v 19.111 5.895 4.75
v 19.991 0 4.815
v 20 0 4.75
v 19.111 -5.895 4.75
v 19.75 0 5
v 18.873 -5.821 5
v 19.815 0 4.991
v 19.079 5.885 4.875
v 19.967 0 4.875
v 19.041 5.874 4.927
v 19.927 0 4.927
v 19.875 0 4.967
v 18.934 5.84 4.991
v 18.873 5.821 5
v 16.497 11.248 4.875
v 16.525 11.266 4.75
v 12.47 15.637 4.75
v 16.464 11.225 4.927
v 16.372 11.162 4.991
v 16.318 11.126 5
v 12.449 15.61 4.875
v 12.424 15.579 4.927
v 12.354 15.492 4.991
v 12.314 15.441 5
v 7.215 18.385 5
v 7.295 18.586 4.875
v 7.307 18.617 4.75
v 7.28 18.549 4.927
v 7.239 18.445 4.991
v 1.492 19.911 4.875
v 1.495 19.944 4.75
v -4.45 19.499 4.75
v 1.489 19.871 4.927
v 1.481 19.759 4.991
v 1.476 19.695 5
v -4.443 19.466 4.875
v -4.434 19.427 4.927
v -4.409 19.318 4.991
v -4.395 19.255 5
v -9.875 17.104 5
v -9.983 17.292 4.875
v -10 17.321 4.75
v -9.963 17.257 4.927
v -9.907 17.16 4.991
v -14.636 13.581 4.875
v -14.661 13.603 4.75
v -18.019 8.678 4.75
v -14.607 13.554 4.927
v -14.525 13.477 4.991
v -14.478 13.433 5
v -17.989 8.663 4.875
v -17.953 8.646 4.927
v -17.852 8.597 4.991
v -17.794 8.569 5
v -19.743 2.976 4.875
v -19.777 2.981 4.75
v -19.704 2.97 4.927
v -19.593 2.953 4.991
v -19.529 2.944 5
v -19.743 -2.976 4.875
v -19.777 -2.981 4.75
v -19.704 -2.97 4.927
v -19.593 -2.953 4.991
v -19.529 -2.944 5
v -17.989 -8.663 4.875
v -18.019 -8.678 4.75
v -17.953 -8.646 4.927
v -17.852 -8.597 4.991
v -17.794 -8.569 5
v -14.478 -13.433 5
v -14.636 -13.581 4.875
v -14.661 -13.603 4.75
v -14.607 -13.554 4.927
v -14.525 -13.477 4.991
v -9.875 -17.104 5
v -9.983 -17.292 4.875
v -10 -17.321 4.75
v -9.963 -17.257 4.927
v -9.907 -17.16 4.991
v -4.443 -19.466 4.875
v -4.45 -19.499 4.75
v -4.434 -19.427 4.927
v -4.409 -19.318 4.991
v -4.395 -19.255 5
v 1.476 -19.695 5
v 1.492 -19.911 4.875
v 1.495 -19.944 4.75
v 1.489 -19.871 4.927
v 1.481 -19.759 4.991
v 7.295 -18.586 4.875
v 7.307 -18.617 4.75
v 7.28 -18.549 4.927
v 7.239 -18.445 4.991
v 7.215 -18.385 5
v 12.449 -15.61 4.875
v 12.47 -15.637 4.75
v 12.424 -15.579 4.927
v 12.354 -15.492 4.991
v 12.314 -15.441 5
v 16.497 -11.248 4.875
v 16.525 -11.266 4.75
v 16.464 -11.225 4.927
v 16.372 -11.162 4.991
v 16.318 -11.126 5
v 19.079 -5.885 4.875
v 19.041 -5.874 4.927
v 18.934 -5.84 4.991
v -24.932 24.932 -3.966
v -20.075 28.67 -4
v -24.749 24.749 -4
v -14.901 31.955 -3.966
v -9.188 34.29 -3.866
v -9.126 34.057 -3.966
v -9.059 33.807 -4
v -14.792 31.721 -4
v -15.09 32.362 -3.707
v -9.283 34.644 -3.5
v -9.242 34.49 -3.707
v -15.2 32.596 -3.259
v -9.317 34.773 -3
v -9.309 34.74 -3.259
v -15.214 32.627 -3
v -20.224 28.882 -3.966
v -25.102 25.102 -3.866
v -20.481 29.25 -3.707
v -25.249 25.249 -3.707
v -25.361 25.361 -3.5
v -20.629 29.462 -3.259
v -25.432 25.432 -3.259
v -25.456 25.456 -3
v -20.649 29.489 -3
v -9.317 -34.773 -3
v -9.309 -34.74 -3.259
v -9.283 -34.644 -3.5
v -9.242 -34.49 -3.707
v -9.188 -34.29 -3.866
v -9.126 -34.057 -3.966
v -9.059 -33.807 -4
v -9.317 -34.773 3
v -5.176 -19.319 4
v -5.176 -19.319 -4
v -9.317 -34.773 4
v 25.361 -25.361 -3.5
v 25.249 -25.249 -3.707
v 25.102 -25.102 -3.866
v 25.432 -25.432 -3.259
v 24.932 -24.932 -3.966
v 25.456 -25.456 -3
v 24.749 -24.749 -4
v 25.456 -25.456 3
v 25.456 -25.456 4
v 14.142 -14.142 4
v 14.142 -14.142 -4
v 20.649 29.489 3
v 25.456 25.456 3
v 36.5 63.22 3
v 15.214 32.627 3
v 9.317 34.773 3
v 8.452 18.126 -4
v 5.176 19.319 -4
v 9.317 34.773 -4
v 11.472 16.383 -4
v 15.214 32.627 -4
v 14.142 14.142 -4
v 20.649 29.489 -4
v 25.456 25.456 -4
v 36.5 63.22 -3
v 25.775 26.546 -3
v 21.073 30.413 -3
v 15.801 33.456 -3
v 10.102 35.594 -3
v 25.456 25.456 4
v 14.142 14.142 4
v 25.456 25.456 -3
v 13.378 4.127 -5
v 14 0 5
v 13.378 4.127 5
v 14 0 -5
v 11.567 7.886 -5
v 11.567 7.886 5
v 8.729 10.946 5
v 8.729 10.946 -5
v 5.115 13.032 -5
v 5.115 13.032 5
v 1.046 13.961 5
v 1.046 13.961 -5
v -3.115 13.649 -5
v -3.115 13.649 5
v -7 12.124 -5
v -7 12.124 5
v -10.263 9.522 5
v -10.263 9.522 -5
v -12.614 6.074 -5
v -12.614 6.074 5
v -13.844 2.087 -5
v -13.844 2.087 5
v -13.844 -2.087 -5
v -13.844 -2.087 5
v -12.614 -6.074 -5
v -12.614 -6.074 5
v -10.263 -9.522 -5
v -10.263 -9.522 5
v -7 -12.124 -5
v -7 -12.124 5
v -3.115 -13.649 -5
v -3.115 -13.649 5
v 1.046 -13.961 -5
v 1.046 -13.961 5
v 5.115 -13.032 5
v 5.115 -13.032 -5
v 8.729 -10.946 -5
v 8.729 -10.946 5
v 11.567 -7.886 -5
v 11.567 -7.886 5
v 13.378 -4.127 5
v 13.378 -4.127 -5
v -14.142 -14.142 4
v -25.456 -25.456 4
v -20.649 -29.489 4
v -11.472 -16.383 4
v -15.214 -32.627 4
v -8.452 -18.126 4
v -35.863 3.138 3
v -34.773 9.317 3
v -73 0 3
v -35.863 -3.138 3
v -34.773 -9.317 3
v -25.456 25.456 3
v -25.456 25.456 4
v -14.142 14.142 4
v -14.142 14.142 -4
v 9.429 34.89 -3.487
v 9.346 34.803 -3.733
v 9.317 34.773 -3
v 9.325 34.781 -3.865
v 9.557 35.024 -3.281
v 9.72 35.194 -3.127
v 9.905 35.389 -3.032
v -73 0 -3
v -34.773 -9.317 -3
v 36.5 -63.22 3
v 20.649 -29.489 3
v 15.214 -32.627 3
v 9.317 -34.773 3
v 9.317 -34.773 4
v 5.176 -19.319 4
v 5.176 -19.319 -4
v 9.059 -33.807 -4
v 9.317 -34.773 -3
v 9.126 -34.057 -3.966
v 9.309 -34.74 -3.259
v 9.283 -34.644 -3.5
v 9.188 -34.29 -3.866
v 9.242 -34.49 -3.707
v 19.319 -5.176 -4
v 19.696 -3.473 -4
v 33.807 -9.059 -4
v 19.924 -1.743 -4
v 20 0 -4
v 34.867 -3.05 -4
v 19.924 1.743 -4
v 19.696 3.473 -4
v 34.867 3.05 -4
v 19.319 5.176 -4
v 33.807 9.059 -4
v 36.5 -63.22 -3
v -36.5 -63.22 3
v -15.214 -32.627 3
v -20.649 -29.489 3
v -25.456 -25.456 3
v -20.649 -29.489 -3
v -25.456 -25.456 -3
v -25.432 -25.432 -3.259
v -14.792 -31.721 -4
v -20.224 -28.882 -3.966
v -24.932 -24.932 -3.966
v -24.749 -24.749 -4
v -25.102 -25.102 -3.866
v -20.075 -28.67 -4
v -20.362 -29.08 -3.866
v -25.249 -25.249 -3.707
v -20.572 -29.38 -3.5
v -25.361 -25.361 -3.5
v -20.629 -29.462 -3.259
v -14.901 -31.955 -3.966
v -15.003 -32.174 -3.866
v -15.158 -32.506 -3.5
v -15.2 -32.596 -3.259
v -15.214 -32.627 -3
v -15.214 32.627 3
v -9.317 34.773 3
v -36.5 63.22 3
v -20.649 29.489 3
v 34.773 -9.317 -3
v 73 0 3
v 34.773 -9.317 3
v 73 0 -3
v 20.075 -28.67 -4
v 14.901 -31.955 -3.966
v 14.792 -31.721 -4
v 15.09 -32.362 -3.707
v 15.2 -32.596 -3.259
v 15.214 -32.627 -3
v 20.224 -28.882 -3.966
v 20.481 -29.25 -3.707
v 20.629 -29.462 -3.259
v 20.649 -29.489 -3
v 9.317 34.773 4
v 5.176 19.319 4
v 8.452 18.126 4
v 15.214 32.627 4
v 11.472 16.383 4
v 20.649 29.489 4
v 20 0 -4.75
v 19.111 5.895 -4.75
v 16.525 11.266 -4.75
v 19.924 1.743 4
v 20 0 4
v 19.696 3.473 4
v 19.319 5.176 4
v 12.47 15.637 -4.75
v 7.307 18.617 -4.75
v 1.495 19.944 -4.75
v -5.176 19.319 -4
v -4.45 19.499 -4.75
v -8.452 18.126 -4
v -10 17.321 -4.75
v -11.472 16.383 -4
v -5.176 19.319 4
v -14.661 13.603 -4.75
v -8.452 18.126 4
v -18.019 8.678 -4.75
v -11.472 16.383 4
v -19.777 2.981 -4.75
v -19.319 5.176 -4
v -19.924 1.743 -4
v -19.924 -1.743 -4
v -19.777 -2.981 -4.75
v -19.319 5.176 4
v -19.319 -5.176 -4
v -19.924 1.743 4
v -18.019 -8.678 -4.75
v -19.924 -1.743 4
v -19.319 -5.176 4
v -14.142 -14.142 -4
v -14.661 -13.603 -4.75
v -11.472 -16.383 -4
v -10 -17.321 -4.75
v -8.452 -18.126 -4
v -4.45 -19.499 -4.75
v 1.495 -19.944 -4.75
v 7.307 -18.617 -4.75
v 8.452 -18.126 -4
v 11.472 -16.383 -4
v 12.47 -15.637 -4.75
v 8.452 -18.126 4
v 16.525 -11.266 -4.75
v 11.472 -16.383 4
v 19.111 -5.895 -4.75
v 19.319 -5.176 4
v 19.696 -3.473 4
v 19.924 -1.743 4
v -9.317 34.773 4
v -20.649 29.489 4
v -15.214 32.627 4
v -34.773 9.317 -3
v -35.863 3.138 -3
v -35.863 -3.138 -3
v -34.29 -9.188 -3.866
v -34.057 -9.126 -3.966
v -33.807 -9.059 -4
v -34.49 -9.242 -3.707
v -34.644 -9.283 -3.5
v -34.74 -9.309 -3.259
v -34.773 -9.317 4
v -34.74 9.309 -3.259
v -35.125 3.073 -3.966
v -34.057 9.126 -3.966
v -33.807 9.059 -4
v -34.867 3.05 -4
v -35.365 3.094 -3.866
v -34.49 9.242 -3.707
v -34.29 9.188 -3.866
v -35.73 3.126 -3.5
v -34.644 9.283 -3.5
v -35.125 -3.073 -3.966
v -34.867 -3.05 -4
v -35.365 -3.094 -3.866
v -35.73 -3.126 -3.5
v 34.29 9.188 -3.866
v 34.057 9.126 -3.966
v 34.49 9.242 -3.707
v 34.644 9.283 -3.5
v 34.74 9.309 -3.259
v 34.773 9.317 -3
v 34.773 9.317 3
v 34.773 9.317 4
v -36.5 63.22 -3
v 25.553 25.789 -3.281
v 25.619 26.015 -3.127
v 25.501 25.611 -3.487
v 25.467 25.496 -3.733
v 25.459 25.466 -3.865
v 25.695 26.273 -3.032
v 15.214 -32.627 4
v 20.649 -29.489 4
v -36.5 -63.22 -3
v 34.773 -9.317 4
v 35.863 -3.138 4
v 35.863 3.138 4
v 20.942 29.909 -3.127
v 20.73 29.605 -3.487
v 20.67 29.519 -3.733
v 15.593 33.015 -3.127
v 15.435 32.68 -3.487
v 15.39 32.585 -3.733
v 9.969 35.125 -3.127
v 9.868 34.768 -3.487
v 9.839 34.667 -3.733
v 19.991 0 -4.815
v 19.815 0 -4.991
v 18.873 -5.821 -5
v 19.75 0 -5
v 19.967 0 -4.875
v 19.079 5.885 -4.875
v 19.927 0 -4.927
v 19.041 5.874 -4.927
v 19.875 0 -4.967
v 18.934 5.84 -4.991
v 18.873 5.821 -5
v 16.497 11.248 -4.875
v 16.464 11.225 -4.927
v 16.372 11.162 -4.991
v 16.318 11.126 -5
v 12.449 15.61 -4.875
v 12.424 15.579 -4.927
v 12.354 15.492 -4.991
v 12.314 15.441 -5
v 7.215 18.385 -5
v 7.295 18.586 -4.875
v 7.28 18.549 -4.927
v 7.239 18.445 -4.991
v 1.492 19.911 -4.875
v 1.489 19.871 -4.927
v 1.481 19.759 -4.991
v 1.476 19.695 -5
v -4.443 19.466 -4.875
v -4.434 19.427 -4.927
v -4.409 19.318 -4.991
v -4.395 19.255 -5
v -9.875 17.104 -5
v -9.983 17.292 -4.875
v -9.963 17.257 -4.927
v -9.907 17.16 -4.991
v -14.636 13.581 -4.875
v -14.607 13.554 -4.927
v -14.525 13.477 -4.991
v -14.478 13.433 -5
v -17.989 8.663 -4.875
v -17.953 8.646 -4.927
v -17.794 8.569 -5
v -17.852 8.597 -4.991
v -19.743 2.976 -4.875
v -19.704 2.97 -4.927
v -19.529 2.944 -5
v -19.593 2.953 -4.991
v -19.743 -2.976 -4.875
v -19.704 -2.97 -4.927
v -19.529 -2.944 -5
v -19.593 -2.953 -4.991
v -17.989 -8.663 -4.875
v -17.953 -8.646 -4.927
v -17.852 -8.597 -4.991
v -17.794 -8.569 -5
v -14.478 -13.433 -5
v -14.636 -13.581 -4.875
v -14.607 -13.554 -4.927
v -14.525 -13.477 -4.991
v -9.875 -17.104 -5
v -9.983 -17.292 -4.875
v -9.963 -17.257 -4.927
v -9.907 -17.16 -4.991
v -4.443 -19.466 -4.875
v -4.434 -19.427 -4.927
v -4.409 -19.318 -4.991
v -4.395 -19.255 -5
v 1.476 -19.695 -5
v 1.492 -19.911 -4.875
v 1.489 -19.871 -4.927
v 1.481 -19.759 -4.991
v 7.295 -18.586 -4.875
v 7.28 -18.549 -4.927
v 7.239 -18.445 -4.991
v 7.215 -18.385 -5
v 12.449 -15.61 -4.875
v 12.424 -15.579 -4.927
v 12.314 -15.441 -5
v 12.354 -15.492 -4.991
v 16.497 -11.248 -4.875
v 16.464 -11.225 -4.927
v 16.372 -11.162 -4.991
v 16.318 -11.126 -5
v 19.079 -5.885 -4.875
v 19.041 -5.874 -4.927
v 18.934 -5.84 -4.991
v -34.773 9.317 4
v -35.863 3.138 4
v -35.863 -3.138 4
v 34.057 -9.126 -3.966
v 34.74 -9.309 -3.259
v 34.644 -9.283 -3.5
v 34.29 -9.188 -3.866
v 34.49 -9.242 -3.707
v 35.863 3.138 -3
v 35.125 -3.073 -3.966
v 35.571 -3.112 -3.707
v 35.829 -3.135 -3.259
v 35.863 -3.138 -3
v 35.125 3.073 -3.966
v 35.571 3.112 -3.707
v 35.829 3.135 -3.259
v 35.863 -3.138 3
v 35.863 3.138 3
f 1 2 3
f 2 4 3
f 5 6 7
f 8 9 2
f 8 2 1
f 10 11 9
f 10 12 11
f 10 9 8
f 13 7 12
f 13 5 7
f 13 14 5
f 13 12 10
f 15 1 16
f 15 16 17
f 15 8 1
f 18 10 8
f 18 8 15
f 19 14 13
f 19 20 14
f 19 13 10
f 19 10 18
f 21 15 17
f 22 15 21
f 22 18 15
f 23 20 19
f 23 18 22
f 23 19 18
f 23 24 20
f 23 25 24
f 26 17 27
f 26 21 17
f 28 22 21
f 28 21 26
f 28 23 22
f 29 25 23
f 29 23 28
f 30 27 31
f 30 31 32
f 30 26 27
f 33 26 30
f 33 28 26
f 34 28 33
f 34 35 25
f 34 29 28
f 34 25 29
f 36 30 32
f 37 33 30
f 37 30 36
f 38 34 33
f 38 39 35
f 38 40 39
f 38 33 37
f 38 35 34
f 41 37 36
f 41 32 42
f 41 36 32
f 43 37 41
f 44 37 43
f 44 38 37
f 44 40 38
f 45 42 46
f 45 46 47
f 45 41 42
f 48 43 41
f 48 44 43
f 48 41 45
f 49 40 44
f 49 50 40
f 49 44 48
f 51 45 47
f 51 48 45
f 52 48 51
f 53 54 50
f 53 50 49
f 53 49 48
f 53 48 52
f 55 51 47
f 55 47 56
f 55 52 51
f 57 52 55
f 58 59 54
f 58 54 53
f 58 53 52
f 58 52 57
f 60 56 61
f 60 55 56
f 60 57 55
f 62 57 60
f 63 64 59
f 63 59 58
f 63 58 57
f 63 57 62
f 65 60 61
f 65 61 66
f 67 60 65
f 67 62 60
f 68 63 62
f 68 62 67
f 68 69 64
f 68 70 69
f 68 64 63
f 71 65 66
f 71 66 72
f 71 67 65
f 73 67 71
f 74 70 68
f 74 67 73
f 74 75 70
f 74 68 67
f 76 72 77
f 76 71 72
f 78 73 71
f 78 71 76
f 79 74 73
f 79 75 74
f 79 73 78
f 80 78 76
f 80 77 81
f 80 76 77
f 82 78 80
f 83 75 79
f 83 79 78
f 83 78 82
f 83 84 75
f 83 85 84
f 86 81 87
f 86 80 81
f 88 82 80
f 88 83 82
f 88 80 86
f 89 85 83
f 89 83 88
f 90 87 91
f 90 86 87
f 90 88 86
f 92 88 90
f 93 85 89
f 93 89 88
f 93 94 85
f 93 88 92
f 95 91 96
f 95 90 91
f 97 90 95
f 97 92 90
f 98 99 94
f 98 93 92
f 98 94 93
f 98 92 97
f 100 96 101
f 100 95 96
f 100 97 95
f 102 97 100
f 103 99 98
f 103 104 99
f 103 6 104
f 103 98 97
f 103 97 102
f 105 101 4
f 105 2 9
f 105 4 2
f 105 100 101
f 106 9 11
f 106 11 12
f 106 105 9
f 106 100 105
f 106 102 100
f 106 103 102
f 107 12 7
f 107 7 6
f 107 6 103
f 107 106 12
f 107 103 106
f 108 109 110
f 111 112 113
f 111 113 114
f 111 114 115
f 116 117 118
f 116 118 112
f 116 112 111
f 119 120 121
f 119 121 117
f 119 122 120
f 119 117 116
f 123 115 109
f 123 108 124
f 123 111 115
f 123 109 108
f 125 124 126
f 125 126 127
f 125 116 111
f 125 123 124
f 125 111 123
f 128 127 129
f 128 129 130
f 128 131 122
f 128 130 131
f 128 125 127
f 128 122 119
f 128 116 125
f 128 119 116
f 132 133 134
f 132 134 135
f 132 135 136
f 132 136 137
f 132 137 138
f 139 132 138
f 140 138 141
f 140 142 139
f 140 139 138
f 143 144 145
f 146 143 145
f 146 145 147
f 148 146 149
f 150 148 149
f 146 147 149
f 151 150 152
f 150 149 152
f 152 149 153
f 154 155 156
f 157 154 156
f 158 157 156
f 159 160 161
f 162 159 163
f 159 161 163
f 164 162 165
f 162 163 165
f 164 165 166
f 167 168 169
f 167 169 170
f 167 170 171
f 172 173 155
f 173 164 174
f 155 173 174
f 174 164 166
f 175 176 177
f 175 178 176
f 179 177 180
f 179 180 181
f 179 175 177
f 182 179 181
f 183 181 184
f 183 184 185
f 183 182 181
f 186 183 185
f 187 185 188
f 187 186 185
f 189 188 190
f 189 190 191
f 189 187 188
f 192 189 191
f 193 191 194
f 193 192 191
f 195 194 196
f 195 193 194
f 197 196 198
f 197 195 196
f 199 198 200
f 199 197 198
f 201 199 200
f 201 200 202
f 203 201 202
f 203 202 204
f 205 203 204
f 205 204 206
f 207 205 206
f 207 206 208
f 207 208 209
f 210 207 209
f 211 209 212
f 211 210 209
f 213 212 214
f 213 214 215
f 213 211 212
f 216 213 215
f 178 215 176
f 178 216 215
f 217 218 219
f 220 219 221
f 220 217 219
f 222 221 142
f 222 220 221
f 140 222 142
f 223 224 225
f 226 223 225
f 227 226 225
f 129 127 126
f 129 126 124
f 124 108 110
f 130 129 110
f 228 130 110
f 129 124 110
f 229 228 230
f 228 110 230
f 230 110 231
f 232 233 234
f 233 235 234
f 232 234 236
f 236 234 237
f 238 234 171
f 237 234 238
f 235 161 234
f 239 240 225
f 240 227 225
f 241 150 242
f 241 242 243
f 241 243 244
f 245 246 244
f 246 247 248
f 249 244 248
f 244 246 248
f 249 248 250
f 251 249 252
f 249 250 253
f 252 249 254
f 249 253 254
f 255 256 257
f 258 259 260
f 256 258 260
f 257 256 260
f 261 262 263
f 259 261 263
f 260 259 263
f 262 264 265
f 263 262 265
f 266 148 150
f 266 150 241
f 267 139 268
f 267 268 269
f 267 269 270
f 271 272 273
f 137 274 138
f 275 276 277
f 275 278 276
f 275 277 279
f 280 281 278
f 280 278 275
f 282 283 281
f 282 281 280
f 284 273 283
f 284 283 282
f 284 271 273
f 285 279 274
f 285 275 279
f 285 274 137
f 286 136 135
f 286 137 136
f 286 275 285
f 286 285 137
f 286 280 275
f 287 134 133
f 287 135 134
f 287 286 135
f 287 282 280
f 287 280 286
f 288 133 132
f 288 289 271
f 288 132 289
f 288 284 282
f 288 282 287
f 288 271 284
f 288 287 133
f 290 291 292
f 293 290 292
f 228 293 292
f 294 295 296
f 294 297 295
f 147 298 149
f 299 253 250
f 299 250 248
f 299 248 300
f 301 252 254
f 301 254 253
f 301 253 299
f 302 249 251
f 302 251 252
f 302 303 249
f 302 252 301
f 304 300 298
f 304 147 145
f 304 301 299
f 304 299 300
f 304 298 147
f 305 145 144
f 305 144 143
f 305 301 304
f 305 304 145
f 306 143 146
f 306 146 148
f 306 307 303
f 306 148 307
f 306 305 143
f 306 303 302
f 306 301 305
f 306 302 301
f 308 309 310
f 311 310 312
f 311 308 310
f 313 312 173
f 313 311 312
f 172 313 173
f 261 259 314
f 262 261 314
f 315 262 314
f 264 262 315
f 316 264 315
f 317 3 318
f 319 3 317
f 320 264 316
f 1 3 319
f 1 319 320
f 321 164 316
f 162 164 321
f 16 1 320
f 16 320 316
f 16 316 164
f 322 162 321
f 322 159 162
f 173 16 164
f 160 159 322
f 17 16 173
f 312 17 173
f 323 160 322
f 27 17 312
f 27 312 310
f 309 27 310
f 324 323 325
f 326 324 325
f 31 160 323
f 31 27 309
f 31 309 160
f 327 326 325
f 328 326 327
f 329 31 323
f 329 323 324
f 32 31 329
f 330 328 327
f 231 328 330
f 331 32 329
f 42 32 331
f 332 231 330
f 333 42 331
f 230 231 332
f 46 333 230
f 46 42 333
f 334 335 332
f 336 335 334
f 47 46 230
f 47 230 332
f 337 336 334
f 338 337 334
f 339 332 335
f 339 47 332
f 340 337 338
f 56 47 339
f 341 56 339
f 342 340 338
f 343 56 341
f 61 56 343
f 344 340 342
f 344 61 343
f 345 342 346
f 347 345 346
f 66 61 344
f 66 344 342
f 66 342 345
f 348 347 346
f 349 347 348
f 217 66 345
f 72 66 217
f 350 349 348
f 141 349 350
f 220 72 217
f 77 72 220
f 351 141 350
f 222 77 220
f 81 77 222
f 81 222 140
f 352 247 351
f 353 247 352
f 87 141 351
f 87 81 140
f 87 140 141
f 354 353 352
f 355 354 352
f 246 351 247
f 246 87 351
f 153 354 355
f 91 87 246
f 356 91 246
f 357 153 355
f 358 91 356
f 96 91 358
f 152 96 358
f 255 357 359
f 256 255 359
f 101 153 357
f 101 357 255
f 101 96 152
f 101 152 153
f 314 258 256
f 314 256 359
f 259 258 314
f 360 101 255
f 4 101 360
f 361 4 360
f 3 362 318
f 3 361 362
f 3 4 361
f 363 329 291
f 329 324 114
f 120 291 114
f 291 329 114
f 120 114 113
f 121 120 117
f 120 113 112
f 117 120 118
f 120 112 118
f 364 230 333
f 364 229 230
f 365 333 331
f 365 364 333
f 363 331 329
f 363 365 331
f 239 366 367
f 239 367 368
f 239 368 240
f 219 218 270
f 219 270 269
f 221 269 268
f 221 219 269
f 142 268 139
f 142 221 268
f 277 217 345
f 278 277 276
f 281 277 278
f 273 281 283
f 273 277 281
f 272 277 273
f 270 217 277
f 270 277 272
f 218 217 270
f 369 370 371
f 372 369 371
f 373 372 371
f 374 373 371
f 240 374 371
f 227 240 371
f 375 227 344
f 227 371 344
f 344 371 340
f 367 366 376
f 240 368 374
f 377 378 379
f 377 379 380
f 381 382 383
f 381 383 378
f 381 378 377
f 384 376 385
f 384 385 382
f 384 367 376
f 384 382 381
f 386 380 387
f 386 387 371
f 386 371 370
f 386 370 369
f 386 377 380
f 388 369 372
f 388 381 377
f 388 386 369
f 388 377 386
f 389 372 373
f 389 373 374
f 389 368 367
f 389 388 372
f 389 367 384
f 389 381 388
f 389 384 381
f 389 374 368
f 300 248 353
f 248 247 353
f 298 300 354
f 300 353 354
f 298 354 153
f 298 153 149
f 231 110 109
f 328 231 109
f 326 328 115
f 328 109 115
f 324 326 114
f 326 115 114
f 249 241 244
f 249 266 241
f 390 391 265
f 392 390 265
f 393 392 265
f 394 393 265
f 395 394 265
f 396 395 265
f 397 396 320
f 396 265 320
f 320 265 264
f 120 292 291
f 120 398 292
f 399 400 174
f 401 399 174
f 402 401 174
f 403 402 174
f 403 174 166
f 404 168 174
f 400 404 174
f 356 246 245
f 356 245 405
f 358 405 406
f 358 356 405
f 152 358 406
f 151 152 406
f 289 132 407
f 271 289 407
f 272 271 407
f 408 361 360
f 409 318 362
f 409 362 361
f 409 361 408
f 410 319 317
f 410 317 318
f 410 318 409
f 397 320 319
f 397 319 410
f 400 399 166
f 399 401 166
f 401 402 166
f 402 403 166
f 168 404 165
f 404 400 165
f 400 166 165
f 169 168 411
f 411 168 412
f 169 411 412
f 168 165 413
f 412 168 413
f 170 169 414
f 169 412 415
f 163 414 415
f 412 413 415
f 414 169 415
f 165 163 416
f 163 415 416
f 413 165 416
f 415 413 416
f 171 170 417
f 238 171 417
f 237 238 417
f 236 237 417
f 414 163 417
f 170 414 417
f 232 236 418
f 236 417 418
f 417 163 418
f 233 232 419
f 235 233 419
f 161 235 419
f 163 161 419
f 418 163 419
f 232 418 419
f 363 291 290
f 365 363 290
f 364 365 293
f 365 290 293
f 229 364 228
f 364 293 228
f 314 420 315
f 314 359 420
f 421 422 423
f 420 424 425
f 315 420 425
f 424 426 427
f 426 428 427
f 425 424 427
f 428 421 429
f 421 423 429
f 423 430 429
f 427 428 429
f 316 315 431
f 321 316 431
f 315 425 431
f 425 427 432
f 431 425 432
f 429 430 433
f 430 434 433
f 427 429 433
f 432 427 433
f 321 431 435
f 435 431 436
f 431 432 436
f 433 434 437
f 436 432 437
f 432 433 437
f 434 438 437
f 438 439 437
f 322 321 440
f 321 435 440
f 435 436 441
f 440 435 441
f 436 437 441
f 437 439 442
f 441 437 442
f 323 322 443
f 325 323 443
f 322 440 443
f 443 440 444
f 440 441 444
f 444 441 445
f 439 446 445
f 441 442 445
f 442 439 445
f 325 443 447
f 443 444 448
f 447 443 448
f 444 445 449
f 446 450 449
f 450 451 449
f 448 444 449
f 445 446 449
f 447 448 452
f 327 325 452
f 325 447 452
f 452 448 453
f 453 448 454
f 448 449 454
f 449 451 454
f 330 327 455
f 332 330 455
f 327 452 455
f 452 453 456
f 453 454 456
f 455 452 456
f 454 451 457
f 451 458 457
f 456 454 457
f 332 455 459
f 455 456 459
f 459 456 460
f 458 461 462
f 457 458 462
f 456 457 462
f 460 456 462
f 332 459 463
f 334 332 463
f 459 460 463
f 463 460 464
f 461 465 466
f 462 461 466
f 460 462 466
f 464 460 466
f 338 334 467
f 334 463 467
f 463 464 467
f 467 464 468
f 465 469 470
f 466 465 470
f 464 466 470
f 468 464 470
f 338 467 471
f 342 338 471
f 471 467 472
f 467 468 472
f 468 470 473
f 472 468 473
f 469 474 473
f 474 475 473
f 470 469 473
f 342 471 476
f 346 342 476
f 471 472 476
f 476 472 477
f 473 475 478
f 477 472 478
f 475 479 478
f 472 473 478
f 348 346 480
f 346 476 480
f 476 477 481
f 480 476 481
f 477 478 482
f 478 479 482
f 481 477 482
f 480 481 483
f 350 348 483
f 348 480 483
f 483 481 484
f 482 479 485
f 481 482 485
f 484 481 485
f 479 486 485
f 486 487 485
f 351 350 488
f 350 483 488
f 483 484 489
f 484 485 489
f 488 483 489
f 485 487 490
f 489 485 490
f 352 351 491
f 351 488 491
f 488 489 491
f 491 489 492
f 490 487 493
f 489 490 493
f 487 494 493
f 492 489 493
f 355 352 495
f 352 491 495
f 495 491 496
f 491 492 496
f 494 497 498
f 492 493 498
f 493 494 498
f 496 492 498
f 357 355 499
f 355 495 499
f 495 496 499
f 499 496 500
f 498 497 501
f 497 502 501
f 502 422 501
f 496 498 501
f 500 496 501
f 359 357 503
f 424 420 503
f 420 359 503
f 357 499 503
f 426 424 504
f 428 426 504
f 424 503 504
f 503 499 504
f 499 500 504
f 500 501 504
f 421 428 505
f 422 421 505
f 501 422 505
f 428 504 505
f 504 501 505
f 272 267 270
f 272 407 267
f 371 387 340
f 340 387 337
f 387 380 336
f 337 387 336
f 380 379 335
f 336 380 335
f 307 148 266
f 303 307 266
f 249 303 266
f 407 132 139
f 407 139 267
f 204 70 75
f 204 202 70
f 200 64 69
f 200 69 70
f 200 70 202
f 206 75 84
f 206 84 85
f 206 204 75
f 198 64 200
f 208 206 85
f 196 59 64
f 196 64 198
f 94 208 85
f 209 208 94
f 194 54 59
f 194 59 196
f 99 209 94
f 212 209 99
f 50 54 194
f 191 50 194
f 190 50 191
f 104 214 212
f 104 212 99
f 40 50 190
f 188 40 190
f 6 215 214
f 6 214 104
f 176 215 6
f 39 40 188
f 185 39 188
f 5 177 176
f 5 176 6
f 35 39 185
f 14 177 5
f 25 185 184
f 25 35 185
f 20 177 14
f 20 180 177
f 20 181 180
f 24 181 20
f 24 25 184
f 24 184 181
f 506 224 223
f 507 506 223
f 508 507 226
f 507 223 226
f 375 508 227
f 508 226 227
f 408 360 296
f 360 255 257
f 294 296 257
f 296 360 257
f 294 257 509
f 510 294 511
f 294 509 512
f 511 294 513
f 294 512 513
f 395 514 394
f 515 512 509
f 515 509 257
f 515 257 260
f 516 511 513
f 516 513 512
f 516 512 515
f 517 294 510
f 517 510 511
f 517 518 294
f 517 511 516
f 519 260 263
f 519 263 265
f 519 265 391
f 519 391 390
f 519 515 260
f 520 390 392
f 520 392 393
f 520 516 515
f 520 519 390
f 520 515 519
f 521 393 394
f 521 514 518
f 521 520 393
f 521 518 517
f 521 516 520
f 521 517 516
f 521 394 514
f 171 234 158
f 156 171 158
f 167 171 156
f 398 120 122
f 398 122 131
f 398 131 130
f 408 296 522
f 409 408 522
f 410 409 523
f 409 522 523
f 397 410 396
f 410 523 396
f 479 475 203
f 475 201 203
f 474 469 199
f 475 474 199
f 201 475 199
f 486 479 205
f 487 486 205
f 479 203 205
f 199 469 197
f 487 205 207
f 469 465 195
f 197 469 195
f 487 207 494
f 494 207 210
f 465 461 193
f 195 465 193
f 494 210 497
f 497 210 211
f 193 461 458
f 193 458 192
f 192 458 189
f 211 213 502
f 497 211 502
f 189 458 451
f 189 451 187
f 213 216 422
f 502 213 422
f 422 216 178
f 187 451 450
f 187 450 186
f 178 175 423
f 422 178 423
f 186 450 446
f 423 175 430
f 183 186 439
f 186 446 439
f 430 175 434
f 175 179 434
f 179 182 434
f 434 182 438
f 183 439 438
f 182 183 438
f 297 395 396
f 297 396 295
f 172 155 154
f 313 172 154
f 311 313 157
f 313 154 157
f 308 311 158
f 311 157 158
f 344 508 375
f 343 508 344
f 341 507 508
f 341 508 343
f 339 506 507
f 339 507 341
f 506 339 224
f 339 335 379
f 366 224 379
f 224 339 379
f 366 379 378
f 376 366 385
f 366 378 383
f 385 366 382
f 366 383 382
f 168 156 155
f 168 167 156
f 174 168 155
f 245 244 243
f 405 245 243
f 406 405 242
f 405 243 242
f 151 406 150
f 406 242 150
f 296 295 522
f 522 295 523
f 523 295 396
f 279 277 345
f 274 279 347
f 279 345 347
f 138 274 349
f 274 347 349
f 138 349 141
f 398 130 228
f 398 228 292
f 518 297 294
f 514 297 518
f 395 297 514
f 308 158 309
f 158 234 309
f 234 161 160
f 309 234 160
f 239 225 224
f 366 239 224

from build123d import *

# Parameters (mm, degrees)
SKETCH1_R           = 20
SKETCH1_R_2         = 14
BOSS_EXTRUDE1_DEPTH = 5
BOSS_EXTRUDE2_DEPTH = 4
BOSS_EXTRUDE3_DEPTH = 3
FILLET1_R           = 0.25
FILLET6_R           = 1


with BuildPart() as part:
    # Sketch1 → Boss-Extrude1 (new, symmetric)
    with BuildSketch(Plane.XY):
        Circle(SKETCH1_R)
        Circle(SKETCH1_R_2, mode=Mode.SUBTRACT)
    extrude(amount=BOSS_EXTRUDE1_DEPTH, both=True)

    # Sketch1<3> → Boss-Extrude2 (add, symmetric)
    with BuildSketch(Plane.XY):
        with BuildLine():
            ThreePointArc((-19.318516526, -5.176380902), (-20, 0), (-19.318516526, 5.176380902))
            Line((-19.318516526, 5.176380902), (-34.773329746, 9.317485624))
            ThreePointArc((-34.773329746, 9.317485624), (-36, 0), (-34.773329746, -9.317485624))
            Line((-34.773329746, -9.317485624), (-19.318516526, -5.176380902))
        make_face()
        with BuildLine():
            ThreePointArc((-14.142135624, 14.142135624), (-10, 17.320508076), (-5.176380902, 19.318516526))
            Line((-5.176380902, 19.318516526), (-9.317485624, 34.773329746))
            ThreePointArc((-9.317485624, 34.773329746), (-18, 31.176914536), (-25.455844123, 25.455844123))
            Line((-25.455844123, 25.455844123), (-14.142135624, 14.142135624))
        make_face()
        with BuildLine():
            ThreePointArc((5.176380902, 19.318516526), (10, 17.320508076), (14.142135624, 14.142135624))
            Line((14.142135624, 14.142135624), (25.455844123, 25.455844123))
            ThreePointArc((25.455844123, 25.455844123), (18, 31.176914536), (9.317485624, 34.773329746))
            Line((9.317485624, 34.773329746), (5.176380902, 19.318516526))
        make_face()
        with BuildLine():
            Line((34.773329746, 9.317485624), (19.318516526, 5.176380902))
            ThreePointArc((19.318516526, 5.176380902), (19.828897227, 2.610523844), (20, 0))
            ThreePointArc((20, 0), (19.828897227, -2.610523844), (19.318516526, -5.176380902))
            Line((19.318516526, -5.176380902), (34.773329746, -9.317485624))
            ThreePointArc((34.773329746, -9.317485624), (36, 0), (34.773329746, 9.317485624))
        make_face()
        with BuildLine():
            Line((25.455844123, -25.455844123), (14.142135624, -14.142135624))
            ThreePointArc((14.142135624, -14.142135624), (10, -17.320508076), (5.176380902, -19.318516526))
            Line((5.176380902, -19.318516526), (9.317485624, -34.773329746))
            ThreePointArc((9.317485624, -34.773329746), (18, -31.176914536), (25.455844123, -25.455844123))
        make_face()
        with BuildLine():
            Line((-9.317485624, -34.773329746), (-5.176380902, -19.318516526))
            ThreePointArc((-5.176380902, -19.318516526), (-10, -17.320508076), (-14.142135624, -14.142135624))
            Line((-14.142135624, -14.142135624), (-25.455844123, -25.455844123))
            ThreePointArc((-25.455844123, -25.455844123), (-18, -31.176914536), (-9.317485624, -34.773329746))
        make_face()
    extrude(amount=BOSS_EXTRUDE2_DEPTH, both=True)

    # Sketch1<4> → Boss-Extrude3 (add, symmetric)
    with BuildSketch(Plane.XY):
        with BuildLine():
            ThreePointArc((-9.317485624, 34.773329746), (-18, 31.176914536), (-25.455844123, 25.455844123))
            Line((-25.455844123, 25.455844123), (-36.5, 63.219854476))
            Line((-36.5, 63.219854476), (-9.317485624, 34.773329746))
        make_face()
        with BuildLine():
            ThreePointArc((25.455844123, 25.455844123), (18, 31.176914536), (9.317485624, 34.773329746))
            Line((9.317485624, 34.773329746), (36.5, 63.219854476))
            Line((36.5, 63.219854476), (25.455844123, 25.455844123))
        make_face()
        with BuildLine():
            ThreePointArc((34.773329746, -9.317485624), (36, 0), (34.773329746, 9.317485624))
            Line((34.773329746, 9.317485624), (73, 0))
            Line((73, 0), (34.773329746, -9.317485624))
        make_face()
        with BuildLine():
            ThreePointArc((9.317485624, -34.773329746), (18, -31.176914536), (25.455844123, -25.455844123))
            Line((25.455844123, -25.455844123), (36.5, -63.219854476))
            Line((36.5, -63.219854476), (9.317485624, -34.773329746))
        make_face()
        with BuildLine():
            ThreePointArc((-25.455844123, -25.455844123), (-18, -31.176914536), (-9.317485624, -34.773329746))
            Line((-9.317485624, -34.773329746), (-36.5, -63.219854476))
            Line((-36.5, -63.219854476), (-25.455844123, -25.455844123))
        make_face()
        with BuildLine():
            ThreePointArc((-34.773329746, 9.317485624), (-36, 0), (-34.773329746, -9.317485624))
            Line((-34.773329746, -9.317485624), (-73, 0))
            Line((-73, 0), (-34.773329746, 9.317485624))
        make_face()
    extrude(amount=BOSS_EXTRUDE3_DEPTH, both=True)

    # Fillet1
    fillet1_edges = [part.edges().sort_by_distance(p)[0] for p in [
        (-20, 0, 5),
        (-20, 0, -5),
    ]]
    fillet(fillet1_edges, radius=FILLET1_R)

    # Fillet6
    # the kernel refuses this fillet: 1 mm, written as the material it adds along each edge
    with BuildSketch(Plane(origin=(0, 0, -3), x_dir=(0.7071067811865468, 0.7071067811865483, 0), z_dir=(0.7071067811865483, -0.7071067811865468, 0))) as fillet6_piece_1_section:
        with BuildLine():
            CenterArc((36 + FILLET6_R, -FILLET6_R), FILLET6_R, 90, 90)
            Line((36 + FILLET6_R, 0), (36, 0))
            Line((36, 0), (36, -FILLET6_R))
        make_face()
    fillet6_piece_1 = revolve(axis=Axis((0, 0, -3), (0, 0, 1)), revolution_arc=30, mode=Mode.PRIVATE)
    fillet6_piece_1 = split(fillet6_piece_1, bisect_by=Plane(origin=(11.853809218, 37.427594574, -3.280987198), z_dir=(0.722987141265996, -0.6908614865253547, 0)), keep=Keep.TOP, mode=Mode.PRIVATE)
    fillet6_piece_1 = split(fillet6_piece_1, bisect_by=Plane(origin=(26.486343095, 28.979497201, -3.280987198), z_dir=(-0.9597971684602362, 0.28069448768316235, 0)), keep=Keep.TOP, mode=Mode.PRIVATE)
    add(fillet6_piece_1)
    # the kernel refuses this fillet: 1 mm, written as the material it takes off along each edge
    with BuildSketch(Plane(origin=(0, 0, -4), x_dir=(0.9456375488425219, -0.325222425762903, 0), z_dir=(-0.325222425762903, -0.9456375488425219, 0))) as fillet6_2_piece_1:
        with BuildLine():
            CenterArc((36 - FILLET6_R, FILLET6_R), FILLET6_R, 270, 90)
            Line((36 - FILLET6_R, 0), (36, 0))
            Line((36, 0), (36, FILLET6_R))
        make_face()
    revolve(axis=Axis((0, 0, -4), (0, 0, 1)), revolution_arc=37.958102254, mode=Mode.SUBTRACT)
    with BuildSketch(Plane(origin=(0, 0, -4), x_dir=(0.19116789183018731, -0.9815573529515235, 0), z_dir=(-0.9815573529515235, -0.19116789183018731, 0))) as fillet6_2_piece_2:
        with BuildLine():
            CenterArc((36 - FILLET6_R, FILLET6_R), FILLET6_R, 270, 90)
            Line((36, FILLET6_R), (36, 0))
            Line((36, 0), (36 - FILLET6_R, 0))
        make_face()
    revolve(axis=Axis((0, 0, -4), (0, 0, 1)), revolution_arc=37.958102254, mode=Mode.SUBTRACT)
    with BuildSketch(Plane(origin=(0, 0, -4), x_dir=(-0.7544696570123329, -0.6563349271886211, 0), z_dir=(-0.6563349271886211, 0.7544696570123329, 0))) as fillet6_2_piece_3:
        with BuildLine():
            CenterArc((36 - FILLET6_R, FILLET6_R), FILLET6_R, 270, 90)
            Line((36, FILLET6_R), (36, 0))
            Line((36, 0), (36 - FILLET6_R, 0))
        make_face()
    revolve(axis=Axis((0, 0, -4), (0, 0, 1)), revolution_arc=37.958102254, mode=Mode.SUBTRACT)
    with BuildSketch(Plane(origin=(0, 0, -4), x_dir=(-0.9456375488425217, 0.32522242576290356, 0), z_dir=(0.32522242576290356, 0.9456375488425217, 0))) as fillet6_2_piece_4:
        with BuildLine():
            CenterArc((36 - FILLET6_R, FILLET6_R), FILLET6_R, 270, 90)
            Line((36 - FILLET6_R, 0), (36, 0))
            Line((36, 0), (36, FILLET6_R))
        make_face()
    revolve(axis=Axis((0, 0, -4), (0, 0, 1)), revolution_arc=37.958102254, mode=Mode.SUBTRACT)
    with BuildSketch(Plane(origin=(0, 0, -4), x_dir=(-0.19116789183018898, 0.9815573529515234, 0), z_dir=(0.9815573529515234, 0.19116789183018898, 0))) as fillet6_2_piece_5:
        with BuildLine():
            CenterArc((36 - FILLET6_R, FILLET6_R), FILLET6_R, 270, 90)
            Line((36 - FILLET6_R, 0), (36, 0))
            Line((36, 0), (36, FILLET6_R))
        make_face()
    revolve(axis=Axis((0, 0, -4), (0, 0, 1)), revolution_arc=37.958102254, mode=Mode.SUBTRACT)


solid = part.part
